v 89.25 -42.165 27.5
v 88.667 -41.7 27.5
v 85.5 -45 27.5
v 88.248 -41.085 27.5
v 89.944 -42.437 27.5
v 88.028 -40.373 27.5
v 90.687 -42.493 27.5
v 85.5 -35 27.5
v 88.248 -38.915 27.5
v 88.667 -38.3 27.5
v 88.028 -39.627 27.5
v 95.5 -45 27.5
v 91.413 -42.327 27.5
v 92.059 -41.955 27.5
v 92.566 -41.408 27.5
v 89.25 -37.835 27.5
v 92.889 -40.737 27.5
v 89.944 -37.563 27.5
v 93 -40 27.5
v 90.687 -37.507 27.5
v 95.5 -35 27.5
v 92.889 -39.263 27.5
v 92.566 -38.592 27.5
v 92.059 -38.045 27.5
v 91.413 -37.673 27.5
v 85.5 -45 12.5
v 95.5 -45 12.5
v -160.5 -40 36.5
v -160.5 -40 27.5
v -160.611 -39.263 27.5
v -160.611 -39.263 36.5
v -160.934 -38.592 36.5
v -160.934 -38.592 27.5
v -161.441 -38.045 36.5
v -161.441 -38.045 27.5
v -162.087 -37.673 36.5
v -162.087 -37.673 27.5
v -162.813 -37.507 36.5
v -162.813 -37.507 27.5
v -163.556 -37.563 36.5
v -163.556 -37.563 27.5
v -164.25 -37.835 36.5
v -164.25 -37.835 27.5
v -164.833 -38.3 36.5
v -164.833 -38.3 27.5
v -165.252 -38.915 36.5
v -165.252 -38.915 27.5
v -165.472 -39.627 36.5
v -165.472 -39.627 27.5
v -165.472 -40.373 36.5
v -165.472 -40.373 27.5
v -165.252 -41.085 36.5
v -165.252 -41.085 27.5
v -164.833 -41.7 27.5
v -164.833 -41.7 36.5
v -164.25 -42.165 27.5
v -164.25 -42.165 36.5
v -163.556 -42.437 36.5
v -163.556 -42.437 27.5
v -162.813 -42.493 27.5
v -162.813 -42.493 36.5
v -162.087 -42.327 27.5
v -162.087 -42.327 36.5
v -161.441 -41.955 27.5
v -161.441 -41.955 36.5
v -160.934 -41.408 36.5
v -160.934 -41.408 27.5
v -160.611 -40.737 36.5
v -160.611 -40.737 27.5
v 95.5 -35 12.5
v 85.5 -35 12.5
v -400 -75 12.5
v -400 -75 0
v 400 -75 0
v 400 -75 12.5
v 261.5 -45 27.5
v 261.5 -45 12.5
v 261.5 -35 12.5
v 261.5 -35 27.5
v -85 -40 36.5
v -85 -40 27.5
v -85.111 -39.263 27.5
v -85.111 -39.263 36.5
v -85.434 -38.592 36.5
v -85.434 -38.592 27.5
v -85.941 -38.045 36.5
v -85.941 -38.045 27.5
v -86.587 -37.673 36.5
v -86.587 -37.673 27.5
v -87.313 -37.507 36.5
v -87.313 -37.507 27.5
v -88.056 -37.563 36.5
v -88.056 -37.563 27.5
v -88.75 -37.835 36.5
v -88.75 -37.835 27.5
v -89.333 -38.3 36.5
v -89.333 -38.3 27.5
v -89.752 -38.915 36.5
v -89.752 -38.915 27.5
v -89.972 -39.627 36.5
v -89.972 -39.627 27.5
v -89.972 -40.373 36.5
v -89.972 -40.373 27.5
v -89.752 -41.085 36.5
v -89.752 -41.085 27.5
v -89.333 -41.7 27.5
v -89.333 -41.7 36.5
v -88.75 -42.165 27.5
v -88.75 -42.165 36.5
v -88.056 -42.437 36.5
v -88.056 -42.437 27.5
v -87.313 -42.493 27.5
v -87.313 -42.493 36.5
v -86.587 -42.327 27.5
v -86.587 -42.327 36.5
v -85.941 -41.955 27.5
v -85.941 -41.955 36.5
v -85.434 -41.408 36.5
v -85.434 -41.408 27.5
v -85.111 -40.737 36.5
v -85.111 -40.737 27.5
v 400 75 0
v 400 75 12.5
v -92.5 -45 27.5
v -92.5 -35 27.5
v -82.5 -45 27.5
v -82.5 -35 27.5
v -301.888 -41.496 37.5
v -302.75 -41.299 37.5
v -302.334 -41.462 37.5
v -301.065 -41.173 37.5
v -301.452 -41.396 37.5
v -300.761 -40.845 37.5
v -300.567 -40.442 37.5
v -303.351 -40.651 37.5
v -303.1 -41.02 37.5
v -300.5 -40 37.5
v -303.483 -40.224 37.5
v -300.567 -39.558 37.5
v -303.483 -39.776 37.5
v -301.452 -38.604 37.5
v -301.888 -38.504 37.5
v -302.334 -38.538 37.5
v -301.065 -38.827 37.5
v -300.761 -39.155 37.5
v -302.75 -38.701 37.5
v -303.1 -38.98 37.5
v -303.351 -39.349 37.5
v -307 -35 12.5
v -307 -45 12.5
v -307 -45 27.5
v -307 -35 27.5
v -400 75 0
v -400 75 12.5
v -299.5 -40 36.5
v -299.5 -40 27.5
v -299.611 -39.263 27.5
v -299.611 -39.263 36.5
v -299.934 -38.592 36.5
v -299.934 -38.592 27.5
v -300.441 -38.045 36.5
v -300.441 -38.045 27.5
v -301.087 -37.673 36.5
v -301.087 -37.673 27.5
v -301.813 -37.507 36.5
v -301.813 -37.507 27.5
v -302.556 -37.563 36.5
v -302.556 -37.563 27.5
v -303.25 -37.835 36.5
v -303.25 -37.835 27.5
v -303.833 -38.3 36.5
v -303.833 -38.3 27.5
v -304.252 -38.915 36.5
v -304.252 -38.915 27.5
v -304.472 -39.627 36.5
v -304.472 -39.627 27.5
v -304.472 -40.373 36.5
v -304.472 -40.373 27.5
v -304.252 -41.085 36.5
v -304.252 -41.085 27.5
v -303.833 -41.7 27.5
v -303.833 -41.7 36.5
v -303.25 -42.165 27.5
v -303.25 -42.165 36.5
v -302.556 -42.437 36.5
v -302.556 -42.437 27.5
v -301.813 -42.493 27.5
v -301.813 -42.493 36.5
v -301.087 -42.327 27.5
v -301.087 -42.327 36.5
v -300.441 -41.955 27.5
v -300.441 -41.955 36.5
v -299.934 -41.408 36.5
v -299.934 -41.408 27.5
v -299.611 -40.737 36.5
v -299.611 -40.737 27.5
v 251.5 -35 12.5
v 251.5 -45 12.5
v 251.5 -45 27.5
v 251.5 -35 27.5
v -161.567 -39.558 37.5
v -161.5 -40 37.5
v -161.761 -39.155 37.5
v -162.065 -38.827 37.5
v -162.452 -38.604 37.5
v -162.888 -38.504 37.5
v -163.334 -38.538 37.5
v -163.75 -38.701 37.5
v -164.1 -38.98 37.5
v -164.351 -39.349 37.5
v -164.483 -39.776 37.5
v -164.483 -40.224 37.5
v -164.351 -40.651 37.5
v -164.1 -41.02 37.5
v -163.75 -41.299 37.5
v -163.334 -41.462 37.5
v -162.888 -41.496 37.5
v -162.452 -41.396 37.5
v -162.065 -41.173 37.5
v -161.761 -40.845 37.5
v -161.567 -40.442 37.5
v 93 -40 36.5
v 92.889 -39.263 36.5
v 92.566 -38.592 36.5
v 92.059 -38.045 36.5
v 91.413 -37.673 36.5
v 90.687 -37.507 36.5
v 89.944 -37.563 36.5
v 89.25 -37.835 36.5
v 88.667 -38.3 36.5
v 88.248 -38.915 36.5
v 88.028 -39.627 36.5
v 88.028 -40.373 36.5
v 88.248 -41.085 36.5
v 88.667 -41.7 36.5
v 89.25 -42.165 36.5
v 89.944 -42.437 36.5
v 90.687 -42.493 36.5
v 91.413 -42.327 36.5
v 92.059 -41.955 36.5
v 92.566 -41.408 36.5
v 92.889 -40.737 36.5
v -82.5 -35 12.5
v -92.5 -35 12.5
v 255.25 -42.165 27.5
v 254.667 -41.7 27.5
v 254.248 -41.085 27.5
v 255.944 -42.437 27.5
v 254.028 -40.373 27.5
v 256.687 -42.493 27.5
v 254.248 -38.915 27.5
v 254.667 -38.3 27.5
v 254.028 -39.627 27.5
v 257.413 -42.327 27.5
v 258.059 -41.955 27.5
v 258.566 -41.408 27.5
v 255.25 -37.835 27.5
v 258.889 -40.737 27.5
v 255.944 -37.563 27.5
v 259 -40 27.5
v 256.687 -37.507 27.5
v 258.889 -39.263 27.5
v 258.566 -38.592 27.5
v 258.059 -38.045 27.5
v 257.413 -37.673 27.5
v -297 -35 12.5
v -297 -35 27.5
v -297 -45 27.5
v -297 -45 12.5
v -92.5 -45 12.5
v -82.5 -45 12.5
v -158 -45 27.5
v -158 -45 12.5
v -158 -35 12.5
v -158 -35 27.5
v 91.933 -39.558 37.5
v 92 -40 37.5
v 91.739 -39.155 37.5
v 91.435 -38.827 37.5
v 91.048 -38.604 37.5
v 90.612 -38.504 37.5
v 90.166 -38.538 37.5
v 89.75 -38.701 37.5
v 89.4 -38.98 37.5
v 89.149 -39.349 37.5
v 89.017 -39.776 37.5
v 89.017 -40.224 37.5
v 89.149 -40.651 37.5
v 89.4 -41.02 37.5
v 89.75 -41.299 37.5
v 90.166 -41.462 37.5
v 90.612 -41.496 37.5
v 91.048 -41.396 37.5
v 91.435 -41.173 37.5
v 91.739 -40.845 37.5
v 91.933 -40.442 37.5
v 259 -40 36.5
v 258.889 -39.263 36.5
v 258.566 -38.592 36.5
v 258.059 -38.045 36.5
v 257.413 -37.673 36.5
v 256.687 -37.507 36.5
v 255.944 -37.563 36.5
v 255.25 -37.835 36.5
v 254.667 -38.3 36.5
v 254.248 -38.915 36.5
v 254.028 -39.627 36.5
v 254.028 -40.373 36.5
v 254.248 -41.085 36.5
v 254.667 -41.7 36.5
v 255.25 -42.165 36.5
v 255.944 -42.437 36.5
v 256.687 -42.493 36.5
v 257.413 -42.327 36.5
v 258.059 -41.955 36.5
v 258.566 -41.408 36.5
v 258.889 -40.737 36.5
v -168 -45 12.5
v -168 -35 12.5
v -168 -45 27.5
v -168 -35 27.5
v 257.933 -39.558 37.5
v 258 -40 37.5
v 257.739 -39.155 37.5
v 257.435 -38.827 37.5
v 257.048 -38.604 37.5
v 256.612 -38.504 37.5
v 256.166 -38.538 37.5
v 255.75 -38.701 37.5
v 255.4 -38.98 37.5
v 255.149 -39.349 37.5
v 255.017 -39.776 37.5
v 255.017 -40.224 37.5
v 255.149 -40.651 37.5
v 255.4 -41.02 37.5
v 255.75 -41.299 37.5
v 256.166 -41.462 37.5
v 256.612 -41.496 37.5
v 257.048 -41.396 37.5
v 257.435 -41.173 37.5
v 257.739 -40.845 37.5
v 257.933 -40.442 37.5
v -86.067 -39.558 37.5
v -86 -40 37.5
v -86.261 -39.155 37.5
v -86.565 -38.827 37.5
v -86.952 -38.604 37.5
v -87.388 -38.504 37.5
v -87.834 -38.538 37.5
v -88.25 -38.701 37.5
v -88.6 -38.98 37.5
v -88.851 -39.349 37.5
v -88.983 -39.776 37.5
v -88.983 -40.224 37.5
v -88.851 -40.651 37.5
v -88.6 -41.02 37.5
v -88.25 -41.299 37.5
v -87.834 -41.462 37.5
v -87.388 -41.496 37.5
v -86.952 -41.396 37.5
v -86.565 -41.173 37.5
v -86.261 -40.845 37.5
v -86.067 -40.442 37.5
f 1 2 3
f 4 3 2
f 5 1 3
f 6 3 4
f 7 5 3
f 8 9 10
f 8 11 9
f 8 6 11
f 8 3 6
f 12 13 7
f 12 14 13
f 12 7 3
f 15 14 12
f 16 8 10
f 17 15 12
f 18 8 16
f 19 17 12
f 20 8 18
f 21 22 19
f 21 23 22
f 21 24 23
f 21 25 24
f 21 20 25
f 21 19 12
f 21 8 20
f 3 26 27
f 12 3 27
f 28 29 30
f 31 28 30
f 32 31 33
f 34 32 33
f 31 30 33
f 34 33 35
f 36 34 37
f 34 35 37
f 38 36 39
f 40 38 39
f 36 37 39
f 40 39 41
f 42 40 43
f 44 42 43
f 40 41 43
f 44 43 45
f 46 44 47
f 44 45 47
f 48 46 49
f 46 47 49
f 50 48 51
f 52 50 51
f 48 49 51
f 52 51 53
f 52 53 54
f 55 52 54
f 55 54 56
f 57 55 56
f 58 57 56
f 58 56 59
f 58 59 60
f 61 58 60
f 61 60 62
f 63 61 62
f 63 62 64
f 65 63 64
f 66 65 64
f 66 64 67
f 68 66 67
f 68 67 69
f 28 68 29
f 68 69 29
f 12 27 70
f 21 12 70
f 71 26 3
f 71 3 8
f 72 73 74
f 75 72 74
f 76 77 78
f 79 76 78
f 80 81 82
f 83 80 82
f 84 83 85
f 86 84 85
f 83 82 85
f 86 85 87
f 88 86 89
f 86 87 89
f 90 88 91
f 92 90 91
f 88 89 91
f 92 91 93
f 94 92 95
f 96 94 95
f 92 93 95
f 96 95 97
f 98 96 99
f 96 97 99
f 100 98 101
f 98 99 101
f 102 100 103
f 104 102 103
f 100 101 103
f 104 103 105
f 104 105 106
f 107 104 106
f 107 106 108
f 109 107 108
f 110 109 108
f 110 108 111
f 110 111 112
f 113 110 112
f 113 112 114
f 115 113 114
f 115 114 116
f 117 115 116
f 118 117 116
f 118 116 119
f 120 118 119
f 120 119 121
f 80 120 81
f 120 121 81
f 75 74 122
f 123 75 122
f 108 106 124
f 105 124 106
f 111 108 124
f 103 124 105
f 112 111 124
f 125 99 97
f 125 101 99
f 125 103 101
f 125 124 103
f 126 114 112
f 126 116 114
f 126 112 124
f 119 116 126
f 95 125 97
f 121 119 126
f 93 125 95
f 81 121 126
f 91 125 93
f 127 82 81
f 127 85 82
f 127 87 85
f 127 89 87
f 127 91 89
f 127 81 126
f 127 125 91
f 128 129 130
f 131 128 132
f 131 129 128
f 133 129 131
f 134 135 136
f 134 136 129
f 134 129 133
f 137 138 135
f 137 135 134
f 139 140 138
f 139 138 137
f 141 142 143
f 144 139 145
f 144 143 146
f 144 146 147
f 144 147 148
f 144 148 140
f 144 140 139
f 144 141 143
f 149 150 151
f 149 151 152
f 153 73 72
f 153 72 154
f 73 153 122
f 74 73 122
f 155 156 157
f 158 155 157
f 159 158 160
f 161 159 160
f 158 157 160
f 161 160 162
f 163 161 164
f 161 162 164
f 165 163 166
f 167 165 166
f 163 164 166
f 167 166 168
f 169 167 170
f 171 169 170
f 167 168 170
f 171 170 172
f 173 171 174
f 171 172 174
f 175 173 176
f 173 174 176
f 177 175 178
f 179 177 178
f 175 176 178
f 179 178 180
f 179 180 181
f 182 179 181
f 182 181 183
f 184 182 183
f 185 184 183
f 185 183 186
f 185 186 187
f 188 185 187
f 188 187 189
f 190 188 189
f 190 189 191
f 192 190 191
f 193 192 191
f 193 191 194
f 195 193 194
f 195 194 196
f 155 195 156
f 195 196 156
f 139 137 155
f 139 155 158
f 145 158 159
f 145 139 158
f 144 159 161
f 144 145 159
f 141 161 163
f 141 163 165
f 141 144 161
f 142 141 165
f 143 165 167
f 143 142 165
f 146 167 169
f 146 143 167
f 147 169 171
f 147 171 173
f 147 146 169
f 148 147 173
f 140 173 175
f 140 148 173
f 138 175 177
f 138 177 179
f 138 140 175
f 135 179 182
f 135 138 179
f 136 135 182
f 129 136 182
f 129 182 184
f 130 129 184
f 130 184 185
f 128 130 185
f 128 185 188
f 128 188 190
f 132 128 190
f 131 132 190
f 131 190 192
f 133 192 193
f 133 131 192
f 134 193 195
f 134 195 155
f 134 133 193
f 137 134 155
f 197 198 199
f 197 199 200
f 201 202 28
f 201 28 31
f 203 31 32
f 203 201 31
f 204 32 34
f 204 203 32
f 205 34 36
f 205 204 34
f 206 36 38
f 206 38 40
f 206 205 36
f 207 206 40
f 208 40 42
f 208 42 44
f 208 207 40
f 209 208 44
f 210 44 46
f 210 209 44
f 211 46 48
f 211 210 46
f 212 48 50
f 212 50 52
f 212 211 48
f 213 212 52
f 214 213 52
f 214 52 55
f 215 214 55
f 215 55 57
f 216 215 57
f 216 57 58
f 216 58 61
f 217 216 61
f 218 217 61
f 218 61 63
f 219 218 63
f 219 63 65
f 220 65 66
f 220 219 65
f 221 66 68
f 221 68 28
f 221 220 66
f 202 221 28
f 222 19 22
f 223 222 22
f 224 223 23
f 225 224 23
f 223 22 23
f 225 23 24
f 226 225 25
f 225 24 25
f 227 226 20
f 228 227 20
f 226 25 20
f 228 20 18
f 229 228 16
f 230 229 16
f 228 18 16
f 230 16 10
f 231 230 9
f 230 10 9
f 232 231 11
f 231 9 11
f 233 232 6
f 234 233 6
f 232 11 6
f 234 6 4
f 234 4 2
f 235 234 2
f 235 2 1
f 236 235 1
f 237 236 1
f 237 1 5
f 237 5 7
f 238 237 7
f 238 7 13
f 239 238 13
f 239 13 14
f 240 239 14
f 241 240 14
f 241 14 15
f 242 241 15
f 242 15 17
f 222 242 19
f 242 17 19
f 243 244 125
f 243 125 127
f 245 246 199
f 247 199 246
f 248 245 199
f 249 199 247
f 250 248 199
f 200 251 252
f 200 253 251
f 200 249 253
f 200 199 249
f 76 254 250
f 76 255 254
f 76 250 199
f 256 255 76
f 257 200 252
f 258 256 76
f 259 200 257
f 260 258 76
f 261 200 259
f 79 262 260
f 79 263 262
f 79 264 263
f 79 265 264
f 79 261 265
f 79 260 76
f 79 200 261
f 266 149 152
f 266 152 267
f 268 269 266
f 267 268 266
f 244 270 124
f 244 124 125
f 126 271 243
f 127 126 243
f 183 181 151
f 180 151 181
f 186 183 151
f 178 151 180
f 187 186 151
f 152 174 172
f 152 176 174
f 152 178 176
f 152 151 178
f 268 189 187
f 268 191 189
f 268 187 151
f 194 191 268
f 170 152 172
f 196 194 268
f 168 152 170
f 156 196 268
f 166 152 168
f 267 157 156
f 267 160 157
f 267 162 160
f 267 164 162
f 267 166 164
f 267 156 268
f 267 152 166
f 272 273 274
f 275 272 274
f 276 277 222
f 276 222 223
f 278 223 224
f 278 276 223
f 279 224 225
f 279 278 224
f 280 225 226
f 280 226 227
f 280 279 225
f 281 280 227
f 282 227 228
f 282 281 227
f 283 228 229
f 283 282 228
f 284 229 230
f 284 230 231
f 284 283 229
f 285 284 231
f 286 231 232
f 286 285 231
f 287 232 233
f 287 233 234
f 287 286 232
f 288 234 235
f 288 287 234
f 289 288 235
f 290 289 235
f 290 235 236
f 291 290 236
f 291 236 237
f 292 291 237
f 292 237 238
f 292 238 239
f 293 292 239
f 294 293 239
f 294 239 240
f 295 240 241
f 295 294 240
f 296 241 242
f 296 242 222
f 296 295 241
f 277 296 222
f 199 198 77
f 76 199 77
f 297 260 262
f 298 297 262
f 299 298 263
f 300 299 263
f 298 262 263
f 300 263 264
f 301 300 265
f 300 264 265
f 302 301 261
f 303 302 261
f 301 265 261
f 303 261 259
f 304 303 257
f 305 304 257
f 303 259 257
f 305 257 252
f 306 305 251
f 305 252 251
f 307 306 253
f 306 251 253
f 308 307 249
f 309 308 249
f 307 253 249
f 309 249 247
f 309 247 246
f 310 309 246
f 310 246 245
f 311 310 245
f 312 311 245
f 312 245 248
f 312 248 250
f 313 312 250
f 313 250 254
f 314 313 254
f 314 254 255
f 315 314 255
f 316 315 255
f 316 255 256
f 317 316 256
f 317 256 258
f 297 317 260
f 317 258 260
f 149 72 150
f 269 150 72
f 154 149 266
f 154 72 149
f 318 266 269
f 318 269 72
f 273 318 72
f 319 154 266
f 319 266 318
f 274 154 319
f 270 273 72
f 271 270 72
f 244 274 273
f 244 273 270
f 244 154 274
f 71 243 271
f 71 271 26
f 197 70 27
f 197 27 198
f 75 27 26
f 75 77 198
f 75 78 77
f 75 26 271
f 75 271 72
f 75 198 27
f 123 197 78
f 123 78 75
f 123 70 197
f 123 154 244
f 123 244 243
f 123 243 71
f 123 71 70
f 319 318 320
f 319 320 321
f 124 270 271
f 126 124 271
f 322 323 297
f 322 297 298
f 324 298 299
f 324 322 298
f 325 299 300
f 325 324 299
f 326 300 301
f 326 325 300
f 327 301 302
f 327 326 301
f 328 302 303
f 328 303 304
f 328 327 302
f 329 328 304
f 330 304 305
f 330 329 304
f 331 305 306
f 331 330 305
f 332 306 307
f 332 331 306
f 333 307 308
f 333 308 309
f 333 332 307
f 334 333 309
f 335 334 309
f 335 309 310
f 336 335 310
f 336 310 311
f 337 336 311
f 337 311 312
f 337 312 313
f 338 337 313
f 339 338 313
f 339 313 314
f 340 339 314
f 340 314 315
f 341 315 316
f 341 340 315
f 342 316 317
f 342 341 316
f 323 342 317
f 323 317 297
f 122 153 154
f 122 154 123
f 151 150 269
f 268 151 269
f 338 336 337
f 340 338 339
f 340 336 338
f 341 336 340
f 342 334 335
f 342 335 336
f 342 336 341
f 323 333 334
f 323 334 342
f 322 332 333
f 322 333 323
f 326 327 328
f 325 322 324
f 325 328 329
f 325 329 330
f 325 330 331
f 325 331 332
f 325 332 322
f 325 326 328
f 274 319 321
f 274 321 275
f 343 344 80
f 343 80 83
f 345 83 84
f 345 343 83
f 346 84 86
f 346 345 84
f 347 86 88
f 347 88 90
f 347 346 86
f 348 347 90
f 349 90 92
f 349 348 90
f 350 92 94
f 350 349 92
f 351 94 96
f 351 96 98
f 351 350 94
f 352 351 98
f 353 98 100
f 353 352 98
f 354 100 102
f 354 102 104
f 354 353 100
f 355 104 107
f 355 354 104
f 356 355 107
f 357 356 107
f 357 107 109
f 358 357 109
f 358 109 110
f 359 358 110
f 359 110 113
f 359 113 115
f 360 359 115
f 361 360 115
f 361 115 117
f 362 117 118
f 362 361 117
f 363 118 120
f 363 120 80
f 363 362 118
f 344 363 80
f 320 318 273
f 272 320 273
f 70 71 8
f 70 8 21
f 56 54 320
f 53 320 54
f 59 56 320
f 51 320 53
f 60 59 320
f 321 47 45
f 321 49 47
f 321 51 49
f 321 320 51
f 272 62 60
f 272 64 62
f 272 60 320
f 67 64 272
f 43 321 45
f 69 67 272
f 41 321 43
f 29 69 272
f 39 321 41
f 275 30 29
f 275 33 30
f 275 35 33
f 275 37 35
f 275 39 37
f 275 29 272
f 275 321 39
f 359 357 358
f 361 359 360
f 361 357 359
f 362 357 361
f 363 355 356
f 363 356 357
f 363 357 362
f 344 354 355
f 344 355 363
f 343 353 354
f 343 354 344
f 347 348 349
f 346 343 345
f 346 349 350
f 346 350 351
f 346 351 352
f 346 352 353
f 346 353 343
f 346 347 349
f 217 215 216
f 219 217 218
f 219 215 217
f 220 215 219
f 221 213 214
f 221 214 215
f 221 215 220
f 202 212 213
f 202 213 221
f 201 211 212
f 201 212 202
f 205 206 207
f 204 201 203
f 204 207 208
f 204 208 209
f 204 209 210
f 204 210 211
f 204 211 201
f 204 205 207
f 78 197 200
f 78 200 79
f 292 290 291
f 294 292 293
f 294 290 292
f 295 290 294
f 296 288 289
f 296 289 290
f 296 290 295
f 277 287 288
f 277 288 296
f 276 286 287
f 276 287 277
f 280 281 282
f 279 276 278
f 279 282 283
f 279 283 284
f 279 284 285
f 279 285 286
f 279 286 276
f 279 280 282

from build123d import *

# Parameters (mm, degrees)
F0_W      = 800
F0_H      = 150
F1_DEPTH  = 12.5
F2_W      = 10
F2_H      = 10
F3_DEPTH  = 15
F4_R      = 2.5
F5_DEPTH  = 10
F6_SIZE   = 1
F7_R      = 2.5
F8_DEPTH  = 10
F9_R      = 2.5
F10_DEPTH = 10
F11_R     = 2.5
F12_DEPTH = 10
F13_R     = 2.5
F14_DEPTH = 10
F15_SIZE  = 1


with BuildPart() as f1:
    # F0 (on Top) → F1 (new body)
    with BuildSketch(Plane.XY):
        Rectangle(F0_W, F0_H)
    extrude(amount=F1_DEPTH)

    # F2 (on face) → F3 (join)
    with BuildSketch(Plane.XY.offset(12.5)):
        with Locations((-302, -40)):
            Rectangle(F2_W, F2_H)
        with Locations((-163, -40)):
            Rectangle(F2_W, F2_H)
        with Locations((-87.5, -40)):
            Rectangle(F2_W, F2_H)
        with Locations((90.5, -40)):
            Rectangle(F2_W, F2_H)
        with Locations((256.5, -40)):
            Rectangle(F2_W, F2_H)
    extrude(amount=F3_DEPTH)

    # F4 (on face) → F5 (join)
    with BuildSketch(Plane.XY.offset(27.5)):
        with Locations((-302, -40)):
            Circle(F4_R)
    extrude(amount=F5_DEPTH)

    # F6
    f6_edges = [f1.edges().sort_by_distance(p)[0] for p in [
        (-304.5, -40, 37.5),
    ]]
    chamfer(f6_edges, length=F6_SIZE)

    # F7 (on face) → F8 (join)
    with BuildSketch(Plane.XY.offset(27.5)):
        with Locations((-163, -40)):
            Circle(F7_R)
    extrude(amount=F8_DEPTH)

    # F9 (on face) → F10 (join)
    with BuildSketch(Plane.XY.offset(27.5)):
        with Locations((-87.5, -40)):
            Circle(F9_R)
    extrude(amount=F10_DEPTH)

    # F11 (on face) → F12 (join)
    with BuildSketch(Plane.XY.offset(27.5)):
        with Locations((90.5, -40)):
            Circle(F11_R)
    extrude(amount=F12_DEPTH)

    # F13 (on face) → F14 (join)
    with BuildSketch(Plane.XY.offset(27.5)):
        with Locations((256.5, -40)):
            Circle(F13_R)
    extrude(amount=F14_DEPTH)

    # F15
    f15_edges = [f1.edges().sort_by_distance(p)[0] for p in [
        (254, -40, 37.5),
        (88, -40, 37.5),
        (-90, -40, 37.5),
        (-165.5, -40, 37.5),
    ]]
    chamfer(f15_edges, length=F15_SIZE)


solid = f1.part
